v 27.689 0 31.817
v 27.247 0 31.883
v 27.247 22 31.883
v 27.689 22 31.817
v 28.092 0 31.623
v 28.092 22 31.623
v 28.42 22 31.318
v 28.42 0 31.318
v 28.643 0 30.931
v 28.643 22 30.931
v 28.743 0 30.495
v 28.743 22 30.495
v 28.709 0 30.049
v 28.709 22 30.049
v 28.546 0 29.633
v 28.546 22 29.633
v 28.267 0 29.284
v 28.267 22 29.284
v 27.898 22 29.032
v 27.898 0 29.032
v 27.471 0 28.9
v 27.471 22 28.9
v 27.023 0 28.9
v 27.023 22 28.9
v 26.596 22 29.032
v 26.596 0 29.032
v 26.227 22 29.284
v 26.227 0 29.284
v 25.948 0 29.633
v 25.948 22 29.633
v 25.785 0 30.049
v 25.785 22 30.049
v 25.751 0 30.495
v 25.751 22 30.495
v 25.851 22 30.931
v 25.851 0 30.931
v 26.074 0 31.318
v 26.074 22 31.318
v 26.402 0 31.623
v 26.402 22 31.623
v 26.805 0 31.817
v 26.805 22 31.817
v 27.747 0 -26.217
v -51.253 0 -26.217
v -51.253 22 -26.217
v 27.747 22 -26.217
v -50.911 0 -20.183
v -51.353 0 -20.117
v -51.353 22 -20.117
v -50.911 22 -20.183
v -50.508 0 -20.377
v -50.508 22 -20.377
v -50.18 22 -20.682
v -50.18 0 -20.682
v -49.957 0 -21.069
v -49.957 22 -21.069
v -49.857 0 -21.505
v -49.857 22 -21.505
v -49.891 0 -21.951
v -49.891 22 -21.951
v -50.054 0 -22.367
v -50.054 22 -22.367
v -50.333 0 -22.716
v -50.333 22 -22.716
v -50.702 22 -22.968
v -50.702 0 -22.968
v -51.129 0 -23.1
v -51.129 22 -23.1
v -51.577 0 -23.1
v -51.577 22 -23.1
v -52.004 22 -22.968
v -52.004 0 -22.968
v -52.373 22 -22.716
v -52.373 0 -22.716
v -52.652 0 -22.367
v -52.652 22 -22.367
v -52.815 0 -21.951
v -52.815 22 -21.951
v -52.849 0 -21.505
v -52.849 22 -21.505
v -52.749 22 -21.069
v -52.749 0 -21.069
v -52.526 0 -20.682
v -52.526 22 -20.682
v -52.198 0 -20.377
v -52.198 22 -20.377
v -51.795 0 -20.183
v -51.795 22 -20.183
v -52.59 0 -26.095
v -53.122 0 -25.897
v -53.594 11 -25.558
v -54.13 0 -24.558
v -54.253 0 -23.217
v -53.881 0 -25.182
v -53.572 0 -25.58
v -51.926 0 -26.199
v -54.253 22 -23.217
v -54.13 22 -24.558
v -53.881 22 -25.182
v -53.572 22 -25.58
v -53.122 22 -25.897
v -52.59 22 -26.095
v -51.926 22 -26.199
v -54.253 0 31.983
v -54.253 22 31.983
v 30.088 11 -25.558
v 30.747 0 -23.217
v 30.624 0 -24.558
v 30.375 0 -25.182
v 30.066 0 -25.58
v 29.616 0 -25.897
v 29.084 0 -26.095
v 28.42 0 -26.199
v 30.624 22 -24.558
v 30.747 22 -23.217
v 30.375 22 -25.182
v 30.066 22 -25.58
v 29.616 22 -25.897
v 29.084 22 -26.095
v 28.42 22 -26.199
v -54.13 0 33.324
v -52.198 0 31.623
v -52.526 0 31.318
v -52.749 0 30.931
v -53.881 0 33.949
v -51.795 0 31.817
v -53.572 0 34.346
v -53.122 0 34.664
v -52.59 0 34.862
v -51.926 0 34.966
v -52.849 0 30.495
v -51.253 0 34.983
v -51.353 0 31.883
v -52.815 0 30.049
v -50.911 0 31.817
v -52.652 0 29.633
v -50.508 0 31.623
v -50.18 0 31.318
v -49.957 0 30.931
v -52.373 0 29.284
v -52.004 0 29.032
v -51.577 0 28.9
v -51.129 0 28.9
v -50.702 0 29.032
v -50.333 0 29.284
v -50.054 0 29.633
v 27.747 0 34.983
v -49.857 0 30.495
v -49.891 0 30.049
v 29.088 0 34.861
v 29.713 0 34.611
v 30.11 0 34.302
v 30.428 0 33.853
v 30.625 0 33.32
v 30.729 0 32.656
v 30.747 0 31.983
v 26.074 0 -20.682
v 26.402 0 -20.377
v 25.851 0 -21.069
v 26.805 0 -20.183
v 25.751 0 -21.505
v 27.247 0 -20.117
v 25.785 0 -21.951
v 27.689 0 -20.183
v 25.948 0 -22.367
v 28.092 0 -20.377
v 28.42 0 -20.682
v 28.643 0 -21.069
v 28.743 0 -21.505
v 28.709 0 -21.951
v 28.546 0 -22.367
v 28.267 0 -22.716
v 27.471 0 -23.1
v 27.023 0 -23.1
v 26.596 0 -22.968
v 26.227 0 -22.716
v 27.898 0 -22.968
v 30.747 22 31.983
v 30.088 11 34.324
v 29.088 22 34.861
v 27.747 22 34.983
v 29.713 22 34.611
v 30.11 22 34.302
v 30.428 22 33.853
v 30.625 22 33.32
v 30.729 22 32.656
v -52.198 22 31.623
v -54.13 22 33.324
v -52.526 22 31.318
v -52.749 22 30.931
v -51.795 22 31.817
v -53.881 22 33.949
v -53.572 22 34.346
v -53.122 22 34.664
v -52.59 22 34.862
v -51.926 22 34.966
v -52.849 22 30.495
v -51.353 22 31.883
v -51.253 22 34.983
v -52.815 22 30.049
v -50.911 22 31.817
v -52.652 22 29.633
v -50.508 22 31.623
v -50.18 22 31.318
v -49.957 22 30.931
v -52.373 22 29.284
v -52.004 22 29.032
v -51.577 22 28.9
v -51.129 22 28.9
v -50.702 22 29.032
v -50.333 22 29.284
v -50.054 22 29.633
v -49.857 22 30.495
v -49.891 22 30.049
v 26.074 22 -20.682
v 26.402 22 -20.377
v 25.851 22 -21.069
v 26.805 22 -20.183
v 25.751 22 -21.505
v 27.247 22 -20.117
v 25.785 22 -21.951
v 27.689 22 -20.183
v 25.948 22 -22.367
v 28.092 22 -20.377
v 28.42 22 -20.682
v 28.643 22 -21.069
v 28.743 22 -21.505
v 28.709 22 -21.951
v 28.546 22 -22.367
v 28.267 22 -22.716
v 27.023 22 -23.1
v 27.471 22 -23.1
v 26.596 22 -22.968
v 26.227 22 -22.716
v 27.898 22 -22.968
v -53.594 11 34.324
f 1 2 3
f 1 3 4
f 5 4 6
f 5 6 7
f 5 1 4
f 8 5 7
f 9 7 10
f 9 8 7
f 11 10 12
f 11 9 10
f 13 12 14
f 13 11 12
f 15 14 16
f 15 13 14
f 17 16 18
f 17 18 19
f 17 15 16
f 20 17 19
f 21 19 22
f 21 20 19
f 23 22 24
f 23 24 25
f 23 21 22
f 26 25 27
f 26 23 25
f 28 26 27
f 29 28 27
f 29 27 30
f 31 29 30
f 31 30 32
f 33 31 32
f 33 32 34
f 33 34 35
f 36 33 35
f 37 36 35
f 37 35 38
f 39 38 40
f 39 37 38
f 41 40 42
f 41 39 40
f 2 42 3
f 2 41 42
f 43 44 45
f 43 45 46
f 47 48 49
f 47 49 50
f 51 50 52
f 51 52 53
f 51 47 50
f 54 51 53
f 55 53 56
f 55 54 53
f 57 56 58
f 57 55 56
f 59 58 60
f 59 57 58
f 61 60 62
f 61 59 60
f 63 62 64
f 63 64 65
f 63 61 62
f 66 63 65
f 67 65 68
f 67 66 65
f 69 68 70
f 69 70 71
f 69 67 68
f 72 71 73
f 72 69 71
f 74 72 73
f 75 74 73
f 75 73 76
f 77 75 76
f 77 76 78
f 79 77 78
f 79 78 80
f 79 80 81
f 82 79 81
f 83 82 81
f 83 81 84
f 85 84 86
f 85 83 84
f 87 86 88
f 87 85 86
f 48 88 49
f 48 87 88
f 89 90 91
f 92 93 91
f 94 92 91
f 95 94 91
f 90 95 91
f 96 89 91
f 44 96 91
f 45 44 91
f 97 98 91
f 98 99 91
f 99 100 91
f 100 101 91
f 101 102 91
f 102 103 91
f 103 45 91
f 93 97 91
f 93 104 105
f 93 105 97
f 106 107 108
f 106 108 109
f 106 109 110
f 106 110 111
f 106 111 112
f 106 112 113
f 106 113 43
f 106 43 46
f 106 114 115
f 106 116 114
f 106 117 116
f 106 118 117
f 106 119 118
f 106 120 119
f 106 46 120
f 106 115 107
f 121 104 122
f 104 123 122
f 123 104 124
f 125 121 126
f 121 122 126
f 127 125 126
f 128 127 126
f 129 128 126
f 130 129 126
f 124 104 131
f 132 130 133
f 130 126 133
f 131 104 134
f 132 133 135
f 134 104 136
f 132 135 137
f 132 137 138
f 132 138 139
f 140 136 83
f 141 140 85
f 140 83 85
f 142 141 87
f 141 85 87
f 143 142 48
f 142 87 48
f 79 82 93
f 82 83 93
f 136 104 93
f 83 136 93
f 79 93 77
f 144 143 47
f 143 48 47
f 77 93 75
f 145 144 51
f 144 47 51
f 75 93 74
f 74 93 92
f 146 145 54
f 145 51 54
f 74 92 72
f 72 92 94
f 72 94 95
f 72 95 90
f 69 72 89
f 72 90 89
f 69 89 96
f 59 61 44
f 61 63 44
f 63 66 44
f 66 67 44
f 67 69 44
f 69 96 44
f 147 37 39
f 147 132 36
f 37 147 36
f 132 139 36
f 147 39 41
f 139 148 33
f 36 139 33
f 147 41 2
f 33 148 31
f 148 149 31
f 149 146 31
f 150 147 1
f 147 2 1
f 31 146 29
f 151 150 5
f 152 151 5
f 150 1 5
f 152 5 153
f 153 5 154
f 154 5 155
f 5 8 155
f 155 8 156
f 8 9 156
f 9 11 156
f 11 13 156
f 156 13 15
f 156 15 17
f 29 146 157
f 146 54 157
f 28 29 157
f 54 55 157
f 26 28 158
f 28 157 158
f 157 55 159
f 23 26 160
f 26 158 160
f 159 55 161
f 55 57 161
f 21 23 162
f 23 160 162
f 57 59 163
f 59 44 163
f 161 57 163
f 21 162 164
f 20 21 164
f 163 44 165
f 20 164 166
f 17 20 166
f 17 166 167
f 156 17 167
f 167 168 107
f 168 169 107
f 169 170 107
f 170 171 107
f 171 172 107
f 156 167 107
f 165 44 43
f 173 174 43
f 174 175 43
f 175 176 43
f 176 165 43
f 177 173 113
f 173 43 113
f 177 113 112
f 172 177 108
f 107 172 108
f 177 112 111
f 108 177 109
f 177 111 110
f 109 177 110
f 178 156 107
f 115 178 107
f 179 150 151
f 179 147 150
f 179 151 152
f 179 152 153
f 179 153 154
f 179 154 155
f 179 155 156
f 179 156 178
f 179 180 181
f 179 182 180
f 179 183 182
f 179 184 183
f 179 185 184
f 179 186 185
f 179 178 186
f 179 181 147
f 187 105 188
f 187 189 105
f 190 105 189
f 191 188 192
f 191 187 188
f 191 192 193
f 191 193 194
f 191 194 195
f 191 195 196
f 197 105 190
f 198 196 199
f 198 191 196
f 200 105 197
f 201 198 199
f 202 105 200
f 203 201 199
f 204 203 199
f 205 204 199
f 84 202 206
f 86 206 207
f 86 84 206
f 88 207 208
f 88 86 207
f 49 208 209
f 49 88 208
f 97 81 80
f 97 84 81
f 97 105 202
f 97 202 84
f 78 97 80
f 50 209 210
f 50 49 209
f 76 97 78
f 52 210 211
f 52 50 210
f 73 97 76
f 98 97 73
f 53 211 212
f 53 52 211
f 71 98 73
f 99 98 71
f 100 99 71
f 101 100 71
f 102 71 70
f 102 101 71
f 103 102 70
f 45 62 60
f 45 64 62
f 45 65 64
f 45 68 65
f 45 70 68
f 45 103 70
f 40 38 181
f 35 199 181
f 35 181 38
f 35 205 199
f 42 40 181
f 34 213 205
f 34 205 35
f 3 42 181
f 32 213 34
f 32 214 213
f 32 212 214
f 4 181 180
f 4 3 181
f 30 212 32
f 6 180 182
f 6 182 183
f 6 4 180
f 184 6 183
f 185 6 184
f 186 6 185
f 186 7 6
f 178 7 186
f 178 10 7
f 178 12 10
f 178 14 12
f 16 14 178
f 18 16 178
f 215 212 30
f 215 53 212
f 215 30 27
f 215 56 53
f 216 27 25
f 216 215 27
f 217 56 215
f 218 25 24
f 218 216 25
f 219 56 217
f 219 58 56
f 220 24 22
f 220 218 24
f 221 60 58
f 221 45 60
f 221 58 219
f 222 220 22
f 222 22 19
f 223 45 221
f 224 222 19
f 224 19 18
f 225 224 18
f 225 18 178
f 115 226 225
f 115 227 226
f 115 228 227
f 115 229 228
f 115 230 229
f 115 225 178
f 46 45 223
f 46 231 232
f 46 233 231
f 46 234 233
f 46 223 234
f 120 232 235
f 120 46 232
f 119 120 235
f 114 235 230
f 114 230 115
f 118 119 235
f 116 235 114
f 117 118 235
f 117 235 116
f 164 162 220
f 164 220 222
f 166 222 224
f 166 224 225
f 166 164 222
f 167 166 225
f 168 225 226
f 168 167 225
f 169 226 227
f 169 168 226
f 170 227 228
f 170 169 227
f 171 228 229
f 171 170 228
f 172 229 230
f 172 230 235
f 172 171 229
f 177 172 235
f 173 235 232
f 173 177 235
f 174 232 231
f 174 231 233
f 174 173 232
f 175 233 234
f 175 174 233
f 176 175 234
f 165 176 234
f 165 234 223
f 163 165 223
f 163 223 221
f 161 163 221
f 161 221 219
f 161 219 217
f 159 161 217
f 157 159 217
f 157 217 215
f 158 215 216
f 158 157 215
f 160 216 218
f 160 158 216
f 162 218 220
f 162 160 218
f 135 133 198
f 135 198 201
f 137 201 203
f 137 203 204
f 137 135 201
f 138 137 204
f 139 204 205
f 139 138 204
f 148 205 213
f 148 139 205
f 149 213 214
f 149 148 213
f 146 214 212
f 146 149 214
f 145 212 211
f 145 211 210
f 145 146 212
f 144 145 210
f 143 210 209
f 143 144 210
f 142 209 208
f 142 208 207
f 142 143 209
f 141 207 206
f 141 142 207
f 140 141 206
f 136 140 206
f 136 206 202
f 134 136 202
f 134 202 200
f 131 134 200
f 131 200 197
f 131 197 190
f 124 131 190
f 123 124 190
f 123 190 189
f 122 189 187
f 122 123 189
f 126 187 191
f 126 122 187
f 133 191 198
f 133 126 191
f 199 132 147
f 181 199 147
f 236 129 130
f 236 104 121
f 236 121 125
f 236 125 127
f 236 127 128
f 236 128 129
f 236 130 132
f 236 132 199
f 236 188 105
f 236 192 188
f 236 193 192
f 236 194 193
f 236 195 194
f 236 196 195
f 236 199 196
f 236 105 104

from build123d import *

# Parameters (mm, degrees)
SKETCH_1_W      = 85
SKETCH_1_H      = 61.2
SKETCH_1_R      = 1.5
EXTRUDE_1_DEPTH = 22
FILLET_1_SIZE   = 3


with BuildPart() as part:
    # 草图1 → 凸台-拉伸1 (new body)
    with BuildSketch(Plane(origin=(0, 0, 0), x_dir=(1, 0, 0), z_dir=(0, 1, 0))):
        with Locations((-11.752972973, -4.383243243)):
            Rectangle(SKETCH_1_W, SKETCH_1_H)
        with Locations(Location((-51.352972973, 21.616756757, 0), (0, 0, 270))):
            Circle(SKETCH_1_R, mode=Mode.SUBTRACT)
        with Locations(Location((-51.352972973, -30.383243243, 0), (0, 0, 270))):
            Circle(SKETCH_1_R, mode=Mode.SUBTRACT)
        with Locations(Location((27.247027027, 21.616756757, 0), (0, 0, 270))):
            Circle(SKETCH_1_R, mode=Mode.SUBTRACT)
        with Locations(Location((27.247027027, -30.383243243, 0), (0, 0, 270))):
            Circle(SKETCH_1_R, mode=Mode.SUBTRACT)
    extrude(amount=EXTRUDE_1_DEPTH)

    # 圆角1
    # a fillet whose section is not a circle: 3 mm, written as the material it takes off along each edge
    with BuildSketch(Plane(origin=(-54.252972973, -7.5, -26.216756757), x_dir=(1, 0, 0), z_dir=(0, 1, 0))) as fillet_1_piece_1:
        with BuildLine():
            add(Edge.make_bspline([(FILLET_1_SIZE, 0), (FILLET_1_SIZE * 0.831801948466, 0), (FILLET_1_SIZE * 0.663603896932, 0), (FILLET_1_SIZE * 0.292893218813, -FILLET_1_SIZE * 0.0716919198361), (FILLET_1_SIZE * 0.0716919198361, -FILLET_1_SIZE * 0.292893218813), (0, -FILLET_1_SIZE * 0.663603896932), (0, -FILLET_1_SIZE * 0.831801948466), (0, -FILLET_1_SIZE)], knots=[0, 0, 0, 0, 0, 0, 0.5, 0.5, 1, 1, 1, 1, 1, 1], degree=5))
            Line((0, -FILLET_1_SIZE), (0, 0))
            Line((0, 0), (FILLET_1_SIZE, 0))
        make_face()
    extrude(amount=37, mode=Mode.SUBTRACT)
    with BuildSketch(Plane(origin=(30.747027027, -7.5, -26.216756757), x_dir=(-1, 0, 0), z_dir=(0, 1, 0)), Plane(origin=(-54.252972973, -7.5, 34.983243243), x_dir=(1, 0, 0), z_dir=(0, 1, 0)), Plane(origin=(30.747027027, -7.5, 34.983243243), x_dir=(0, 0, -1), z_dir=(0, 1, 0))) as fillet_1_piece_2:
        with BuildLine():
            add(Edge.make_bspline([(FILLET_1_SIZE, 0), (FILLET_1_SIZE * 0.831801948466, 0), (FILLET_1_SIZE * 0.663603896932, 0), (FILLET_1_SIZE * 0.292893218813, FILLET_1_SIZE * 0.0716919198361), (FILLET_1_SIZE * 0.0716919198361, FILLET_1_SIZE * 0.292893218813), (0, FILLET_1_SIZE * 0.663603896932), (0, FILLET_1_SIZE * 0.831801948466), (0, FILLET_1_SIZE)], knots=[0, 0, 0, 0, 0, 0, 0.5, 0.5, 1, 1, 1, 1, 1, 1], degree=5))
            Line((0, FILLET_1_SIZE), (0, 0))
            Line((0, 0), (FILLET_1_SIZE, 0))
        make_face()
    extrude(amount=37, mode=Mode.SUBTRACT)


solid = part.part
